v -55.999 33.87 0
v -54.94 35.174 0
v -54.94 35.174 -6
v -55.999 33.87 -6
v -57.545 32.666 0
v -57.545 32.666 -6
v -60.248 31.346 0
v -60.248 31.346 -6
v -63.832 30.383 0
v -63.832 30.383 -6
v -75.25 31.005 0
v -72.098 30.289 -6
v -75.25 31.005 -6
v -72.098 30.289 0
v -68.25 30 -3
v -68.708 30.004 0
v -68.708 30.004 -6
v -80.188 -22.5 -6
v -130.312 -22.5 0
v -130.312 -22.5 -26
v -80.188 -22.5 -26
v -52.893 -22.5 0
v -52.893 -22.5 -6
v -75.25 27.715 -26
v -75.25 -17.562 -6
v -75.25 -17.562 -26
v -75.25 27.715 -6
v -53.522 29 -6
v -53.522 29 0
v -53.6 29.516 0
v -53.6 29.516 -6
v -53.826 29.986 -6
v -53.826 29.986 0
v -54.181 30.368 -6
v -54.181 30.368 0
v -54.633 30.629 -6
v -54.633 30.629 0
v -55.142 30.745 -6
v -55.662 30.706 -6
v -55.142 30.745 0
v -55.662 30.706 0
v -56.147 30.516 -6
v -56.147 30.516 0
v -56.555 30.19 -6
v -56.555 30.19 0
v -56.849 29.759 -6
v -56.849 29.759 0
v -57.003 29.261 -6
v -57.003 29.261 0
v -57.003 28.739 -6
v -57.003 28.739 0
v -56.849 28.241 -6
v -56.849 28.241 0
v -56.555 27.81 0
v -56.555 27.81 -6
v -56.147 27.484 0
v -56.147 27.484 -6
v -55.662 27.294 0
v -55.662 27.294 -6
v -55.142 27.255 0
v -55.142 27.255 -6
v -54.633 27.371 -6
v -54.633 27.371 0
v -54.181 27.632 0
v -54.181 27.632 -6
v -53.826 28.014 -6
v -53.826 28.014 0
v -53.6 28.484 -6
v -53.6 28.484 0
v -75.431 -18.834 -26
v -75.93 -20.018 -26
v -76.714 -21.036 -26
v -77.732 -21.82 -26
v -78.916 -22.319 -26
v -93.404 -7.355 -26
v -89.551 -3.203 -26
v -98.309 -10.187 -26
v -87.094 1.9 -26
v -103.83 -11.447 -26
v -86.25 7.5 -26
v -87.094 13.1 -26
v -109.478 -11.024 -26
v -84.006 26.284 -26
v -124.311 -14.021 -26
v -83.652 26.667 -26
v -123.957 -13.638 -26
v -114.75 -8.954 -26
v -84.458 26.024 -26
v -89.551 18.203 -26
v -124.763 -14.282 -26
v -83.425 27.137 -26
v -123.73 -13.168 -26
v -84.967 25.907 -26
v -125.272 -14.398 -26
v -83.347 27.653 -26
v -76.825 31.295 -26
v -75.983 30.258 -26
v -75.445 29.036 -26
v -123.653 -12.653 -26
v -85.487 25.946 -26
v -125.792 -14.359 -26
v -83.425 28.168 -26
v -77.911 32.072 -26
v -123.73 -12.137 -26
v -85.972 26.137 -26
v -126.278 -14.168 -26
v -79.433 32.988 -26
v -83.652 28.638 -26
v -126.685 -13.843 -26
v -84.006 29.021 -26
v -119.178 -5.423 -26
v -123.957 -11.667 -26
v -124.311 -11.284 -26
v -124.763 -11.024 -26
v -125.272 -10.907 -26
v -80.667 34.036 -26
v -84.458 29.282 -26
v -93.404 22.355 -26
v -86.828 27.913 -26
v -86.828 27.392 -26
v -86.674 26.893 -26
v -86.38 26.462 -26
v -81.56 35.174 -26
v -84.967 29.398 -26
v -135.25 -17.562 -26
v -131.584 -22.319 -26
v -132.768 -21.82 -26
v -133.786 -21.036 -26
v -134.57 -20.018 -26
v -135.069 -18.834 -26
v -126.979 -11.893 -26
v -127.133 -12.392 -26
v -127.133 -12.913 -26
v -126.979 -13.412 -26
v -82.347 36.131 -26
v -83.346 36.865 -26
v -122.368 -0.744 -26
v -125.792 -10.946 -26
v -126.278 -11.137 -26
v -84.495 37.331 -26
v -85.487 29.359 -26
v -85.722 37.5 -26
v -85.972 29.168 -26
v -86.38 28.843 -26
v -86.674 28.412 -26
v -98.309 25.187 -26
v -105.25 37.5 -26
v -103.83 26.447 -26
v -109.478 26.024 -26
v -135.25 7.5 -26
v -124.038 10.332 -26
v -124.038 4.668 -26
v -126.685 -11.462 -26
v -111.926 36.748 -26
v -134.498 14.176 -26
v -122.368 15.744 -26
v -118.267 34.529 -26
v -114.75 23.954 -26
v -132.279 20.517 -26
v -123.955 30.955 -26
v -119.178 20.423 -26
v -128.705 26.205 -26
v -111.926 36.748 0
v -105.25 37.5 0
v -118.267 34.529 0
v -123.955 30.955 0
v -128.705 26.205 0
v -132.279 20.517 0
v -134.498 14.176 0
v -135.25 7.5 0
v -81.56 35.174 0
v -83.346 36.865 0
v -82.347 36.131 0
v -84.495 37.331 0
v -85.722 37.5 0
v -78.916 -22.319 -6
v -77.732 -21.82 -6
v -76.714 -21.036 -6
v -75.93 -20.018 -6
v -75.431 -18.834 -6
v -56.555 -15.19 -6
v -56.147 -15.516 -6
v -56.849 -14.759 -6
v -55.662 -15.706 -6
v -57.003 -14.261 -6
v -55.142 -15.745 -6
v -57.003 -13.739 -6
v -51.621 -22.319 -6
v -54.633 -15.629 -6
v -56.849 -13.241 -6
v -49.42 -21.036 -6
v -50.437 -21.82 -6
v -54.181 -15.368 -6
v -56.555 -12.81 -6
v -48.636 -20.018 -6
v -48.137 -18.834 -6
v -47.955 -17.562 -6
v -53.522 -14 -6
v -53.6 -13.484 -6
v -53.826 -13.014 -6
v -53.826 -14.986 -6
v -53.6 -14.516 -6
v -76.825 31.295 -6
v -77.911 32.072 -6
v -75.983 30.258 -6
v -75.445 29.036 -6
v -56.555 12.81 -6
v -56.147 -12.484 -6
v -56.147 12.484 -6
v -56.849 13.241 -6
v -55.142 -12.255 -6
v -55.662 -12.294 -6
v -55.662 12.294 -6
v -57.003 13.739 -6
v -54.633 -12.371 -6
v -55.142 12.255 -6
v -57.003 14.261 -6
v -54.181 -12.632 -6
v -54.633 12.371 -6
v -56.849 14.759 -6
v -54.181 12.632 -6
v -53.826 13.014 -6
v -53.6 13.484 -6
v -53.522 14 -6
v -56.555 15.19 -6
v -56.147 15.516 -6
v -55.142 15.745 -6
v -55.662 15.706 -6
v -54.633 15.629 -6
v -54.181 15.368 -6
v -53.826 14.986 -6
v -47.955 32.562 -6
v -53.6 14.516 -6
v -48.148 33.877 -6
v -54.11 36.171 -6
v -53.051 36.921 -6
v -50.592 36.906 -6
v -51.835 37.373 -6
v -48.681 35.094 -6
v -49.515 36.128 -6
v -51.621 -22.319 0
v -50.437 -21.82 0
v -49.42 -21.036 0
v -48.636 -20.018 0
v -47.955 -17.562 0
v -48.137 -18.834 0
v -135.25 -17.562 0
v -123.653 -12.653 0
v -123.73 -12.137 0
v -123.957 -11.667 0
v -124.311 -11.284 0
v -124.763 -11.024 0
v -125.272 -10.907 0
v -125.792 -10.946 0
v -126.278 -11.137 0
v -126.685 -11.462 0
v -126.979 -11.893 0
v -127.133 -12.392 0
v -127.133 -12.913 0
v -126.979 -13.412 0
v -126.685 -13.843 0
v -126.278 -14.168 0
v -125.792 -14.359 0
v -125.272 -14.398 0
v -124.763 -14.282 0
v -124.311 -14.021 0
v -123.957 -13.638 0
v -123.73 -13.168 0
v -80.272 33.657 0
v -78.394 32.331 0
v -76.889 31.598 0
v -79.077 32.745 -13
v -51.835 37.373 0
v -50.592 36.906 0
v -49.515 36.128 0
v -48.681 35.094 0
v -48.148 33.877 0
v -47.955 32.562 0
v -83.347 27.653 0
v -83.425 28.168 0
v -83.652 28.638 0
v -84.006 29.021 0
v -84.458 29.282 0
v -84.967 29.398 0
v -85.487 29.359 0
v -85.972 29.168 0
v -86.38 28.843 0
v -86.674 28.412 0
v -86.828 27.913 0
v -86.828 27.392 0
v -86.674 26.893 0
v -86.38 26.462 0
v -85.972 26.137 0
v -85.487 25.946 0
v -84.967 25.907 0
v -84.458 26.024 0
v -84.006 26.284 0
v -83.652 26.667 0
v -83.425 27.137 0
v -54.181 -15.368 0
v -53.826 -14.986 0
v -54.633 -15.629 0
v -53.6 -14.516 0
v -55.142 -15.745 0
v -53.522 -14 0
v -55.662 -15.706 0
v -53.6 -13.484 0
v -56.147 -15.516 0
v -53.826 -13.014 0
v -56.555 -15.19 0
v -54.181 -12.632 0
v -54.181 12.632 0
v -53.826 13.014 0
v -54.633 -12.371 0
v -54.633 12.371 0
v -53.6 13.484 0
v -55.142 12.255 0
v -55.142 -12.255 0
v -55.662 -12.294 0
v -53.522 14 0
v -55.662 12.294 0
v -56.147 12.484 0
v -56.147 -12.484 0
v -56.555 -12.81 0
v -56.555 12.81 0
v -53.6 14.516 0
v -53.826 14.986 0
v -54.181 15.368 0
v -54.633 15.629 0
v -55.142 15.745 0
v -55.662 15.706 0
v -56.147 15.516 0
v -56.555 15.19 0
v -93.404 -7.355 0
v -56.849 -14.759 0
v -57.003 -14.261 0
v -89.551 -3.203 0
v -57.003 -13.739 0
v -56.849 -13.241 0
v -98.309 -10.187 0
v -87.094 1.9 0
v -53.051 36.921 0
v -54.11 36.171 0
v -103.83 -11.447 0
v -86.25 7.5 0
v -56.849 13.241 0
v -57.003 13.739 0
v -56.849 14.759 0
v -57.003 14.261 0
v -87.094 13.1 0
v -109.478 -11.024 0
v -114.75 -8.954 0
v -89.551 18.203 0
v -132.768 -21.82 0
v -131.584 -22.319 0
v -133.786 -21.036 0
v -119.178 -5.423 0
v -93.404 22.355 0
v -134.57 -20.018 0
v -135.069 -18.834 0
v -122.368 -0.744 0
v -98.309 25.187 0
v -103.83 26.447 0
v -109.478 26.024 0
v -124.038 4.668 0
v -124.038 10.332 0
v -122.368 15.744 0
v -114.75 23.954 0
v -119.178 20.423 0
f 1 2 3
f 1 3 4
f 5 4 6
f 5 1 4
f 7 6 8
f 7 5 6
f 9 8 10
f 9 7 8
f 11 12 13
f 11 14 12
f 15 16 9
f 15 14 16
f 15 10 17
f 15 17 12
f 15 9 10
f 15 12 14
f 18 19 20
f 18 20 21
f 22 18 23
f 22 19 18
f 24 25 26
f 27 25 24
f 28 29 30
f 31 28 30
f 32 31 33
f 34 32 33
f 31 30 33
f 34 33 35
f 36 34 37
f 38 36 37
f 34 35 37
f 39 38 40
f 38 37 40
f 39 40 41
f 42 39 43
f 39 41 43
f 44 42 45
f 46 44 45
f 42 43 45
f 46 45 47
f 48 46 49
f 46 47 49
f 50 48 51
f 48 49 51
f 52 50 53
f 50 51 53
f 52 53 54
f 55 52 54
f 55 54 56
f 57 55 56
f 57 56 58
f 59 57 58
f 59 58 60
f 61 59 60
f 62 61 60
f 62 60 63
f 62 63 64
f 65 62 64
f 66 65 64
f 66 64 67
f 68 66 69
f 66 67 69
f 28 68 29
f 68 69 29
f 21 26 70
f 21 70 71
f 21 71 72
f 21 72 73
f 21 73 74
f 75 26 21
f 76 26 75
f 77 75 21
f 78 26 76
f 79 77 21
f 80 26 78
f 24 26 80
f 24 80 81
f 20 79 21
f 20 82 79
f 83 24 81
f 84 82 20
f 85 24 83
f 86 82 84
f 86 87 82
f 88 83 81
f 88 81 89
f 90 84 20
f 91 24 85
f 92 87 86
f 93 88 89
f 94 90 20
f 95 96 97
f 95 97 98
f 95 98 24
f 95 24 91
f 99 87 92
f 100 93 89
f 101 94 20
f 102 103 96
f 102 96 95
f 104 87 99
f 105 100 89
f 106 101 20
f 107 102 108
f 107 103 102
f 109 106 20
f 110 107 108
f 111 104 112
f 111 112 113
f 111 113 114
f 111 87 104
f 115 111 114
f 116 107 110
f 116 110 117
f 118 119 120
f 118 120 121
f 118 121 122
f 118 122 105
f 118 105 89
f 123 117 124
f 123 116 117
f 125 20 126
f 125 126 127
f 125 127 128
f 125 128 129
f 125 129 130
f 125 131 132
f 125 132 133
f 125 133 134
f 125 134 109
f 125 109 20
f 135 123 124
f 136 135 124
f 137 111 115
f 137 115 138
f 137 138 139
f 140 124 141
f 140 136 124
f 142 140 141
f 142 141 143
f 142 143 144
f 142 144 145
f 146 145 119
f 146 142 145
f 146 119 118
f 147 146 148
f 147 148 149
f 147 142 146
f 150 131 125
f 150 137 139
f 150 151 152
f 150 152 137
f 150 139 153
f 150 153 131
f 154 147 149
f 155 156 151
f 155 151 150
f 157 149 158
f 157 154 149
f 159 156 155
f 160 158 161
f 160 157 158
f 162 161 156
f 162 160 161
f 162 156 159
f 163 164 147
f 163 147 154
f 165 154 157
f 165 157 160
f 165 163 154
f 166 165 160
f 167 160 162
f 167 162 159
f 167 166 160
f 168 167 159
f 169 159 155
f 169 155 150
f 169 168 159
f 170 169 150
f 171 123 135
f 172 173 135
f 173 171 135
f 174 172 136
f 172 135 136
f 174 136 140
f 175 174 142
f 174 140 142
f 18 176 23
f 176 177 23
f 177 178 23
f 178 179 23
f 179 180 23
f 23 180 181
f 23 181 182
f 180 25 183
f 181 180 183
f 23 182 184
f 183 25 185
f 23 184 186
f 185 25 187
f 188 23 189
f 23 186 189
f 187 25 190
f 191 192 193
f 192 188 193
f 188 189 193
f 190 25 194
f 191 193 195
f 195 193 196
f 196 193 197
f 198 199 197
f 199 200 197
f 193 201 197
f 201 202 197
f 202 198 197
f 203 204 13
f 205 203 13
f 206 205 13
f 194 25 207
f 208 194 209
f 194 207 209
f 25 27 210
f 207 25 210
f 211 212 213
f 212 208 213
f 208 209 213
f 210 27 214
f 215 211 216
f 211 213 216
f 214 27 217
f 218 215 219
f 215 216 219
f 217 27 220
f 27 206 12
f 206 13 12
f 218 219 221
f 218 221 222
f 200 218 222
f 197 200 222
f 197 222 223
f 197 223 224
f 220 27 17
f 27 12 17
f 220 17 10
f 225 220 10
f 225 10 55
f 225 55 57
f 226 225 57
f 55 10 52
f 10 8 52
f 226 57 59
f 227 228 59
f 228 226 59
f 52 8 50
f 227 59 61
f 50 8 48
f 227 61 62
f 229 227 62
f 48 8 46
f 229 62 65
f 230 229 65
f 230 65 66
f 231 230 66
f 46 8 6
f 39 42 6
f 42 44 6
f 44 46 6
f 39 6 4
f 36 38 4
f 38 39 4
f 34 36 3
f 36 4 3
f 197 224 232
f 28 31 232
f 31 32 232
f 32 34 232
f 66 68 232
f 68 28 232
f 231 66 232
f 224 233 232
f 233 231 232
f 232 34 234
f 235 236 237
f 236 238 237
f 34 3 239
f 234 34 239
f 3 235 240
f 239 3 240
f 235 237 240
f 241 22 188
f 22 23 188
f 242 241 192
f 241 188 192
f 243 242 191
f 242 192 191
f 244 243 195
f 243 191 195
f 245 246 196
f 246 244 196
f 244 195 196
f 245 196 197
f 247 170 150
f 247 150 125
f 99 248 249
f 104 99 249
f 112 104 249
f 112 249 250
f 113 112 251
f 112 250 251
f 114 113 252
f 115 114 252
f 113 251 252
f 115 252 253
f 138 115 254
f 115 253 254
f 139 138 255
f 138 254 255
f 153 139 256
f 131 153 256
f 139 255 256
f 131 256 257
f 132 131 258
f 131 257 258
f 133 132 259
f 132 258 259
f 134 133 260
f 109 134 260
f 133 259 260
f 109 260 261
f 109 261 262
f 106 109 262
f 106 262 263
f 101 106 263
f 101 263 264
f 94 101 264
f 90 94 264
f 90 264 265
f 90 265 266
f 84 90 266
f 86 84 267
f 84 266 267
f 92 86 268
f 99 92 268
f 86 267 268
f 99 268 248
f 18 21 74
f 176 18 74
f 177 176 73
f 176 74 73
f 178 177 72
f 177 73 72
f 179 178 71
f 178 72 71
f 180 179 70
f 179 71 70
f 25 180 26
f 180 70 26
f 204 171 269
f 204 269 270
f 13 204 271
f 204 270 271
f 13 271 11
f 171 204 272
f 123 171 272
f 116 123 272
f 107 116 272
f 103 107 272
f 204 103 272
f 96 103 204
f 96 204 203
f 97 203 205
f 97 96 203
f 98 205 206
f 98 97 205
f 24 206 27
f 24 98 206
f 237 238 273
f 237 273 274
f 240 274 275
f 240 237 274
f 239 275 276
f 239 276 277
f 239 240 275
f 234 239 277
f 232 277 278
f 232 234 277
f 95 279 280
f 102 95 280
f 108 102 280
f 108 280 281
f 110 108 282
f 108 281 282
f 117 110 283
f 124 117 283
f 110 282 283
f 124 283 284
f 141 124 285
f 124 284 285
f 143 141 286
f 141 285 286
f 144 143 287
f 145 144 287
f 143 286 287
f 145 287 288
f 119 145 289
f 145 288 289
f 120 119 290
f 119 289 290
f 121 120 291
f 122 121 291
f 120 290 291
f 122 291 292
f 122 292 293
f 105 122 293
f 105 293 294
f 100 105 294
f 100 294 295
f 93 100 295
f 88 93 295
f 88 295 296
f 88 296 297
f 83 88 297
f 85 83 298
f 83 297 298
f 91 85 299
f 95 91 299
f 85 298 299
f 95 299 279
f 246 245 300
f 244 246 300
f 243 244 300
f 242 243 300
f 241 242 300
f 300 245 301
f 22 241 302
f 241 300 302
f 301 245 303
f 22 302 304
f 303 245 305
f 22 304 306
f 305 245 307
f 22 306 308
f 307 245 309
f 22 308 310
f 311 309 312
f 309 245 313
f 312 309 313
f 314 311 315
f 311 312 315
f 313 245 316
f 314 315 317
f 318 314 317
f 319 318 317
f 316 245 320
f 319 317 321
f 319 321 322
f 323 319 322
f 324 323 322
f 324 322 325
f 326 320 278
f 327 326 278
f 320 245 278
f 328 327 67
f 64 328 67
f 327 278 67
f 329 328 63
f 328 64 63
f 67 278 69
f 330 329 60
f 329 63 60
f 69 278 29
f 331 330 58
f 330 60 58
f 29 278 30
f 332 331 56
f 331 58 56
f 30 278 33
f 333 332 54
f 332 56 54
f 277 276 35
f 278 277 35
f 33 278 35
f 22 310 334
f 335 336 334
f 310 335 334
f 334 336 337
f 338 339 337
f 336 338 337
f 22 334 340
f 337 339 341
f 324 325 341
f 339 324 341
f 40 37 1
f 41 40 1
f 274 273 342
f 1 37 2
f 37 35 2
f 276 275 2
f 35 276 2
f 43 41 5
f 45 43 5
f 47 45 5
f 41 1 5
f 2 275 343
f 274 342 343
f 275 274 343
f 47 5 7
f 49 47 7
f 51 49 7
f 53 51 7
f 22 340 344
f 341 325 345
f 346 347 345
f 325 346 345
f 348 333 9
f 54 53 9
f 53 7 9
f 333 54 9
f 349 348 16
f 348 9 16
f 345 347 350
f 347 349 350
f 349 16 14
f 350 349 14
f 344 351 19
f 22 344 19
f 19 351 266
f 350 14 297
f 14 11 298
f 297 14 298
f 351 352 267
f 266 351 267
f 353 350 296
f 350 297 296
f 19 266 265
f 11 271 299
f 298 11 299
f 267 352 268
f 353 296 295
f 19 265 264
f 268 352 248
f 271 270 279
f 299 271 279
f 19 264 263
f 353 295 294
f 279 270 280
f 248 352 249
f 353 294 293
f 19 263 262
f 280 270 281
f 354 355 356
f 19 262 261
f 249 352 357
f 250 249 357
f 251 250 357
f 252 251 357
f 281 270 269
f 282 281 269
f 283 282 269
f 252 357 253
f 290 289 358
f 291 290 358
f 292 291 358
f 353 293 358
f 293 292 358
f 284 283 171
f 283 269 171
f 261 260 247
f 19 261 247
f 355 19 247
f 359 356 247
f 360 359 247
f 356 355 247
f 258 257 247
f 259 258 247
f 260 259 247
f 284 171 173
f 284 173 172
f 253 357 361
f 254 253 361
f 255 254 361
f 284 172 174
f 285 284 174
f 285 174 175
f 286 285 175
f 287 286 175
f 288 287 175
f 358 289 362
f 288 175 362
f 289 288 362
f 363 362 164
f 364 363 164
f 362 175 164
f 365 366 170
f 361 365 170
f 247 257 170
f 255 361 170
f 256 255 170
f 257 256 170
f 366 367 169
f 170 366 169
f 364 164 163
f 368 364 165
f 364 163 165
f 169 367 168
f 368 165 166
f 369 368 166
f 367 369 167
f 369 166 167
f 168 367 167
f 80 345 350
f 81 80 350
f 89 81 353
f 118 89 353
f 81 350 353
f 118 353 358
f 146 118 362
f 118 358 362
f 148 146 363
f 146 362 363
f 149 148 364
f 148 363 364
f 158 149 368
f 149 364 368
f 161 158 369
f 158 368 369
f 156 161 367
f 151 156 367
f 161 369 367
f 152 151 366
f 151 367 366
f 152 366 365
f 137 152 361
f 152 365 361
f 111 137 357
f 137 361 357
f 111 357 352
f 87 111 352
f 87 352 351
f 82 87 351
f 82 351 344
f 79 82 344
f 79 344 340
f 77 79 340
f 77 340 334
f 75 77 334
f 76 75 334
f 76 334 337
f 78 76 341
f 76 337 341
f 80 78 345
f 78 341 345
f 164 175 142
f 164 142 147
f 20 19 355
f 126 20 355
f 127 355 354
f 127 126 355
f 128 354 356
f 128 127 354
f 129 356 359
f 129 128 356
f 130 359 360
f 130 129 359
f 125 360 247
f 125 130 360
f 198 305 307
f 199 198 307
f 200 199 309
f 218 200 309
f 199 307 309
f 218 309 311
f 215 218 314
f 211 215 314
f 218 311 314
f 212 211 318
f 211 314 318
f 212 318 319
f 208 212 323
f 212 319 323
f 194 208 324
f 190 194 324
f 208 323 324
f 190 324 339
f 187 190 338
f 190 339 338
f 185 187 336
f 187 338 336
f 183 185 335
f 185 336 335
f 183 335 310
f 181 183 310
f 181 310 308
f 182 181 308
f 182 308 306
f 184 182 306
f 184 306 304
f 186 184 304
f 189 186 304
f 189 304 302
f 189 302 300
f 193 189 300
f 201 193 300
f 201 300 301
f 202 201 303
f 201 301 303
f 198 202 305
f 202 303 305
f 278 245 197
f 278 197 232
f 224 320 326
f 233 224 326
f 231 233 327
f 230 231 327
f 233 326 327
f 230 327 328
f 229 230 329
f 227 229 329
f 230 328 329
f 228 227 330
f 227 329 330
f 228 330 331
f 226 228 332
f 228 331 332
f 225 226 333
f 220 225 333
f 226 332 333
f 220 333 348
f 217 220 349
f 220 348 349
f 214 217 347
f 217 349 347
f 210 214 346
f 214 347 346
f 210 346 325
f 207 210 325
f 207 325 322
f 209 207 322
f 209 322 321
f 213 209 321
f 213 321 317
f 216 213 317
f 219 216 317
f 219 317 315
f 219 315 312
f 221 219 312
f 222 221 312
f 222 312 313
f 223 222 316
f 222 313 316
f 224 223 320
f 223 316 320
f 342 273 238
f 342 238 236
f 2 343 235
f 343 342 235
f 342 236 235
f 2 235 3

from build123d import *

# Parameters (mm, degrees)
F0_R         = 1.75
F1_DEPTH     = 6
F0_R_2       = 19
F2_DEPTH     = 26
F3_T1_DEPTH  = 51.0048285071
F3_T3_DEPTH  = 32.5024142536
F3_T5_DEPTH  = 23.67798751
F3_T7_DEPTH  = 31.0048285071
F3_T9_DEPTH  = 43.67798751
F3_T11_DEPTH = 28.3837127694


# Not quite as in the source:
# - a fillet or chamfer that OpenCascade refuses, or shapes differently, is made with other operations: its cross-section is extruded or revolved along the edge and cut away or added


with BuildPart() as f1:
    # F0 (on Top) → F1 (new body)
    with BuildSketch(Plane.XY):
        with BuildLine():
            Line((-47.9554124177, 37.5), (-54.25, 37.5))
            add(Edge.make_bspline(
                [(-68.25, 30), (-54.25, 30), (-54.25, 37.5)],
                knots=[1.5707963268, 1.5707963268, 1.5707963268, 3.1415926536, 3.1415926536, 3.1415926536], degree=2, weights=[1, 0.7071067812, 1]))
            Line((-68.25, 30), (-68.25, -22.5))
            Line((-68.25, -22.5), (-47.9554124177, -22.5))
            Line((-47.9554124177, -22.5), (-47.9554124177, 37.5))
        make_face()
        with Locations((-55.2723892033, -14)):
            Circle(F0_R, mode=Mode.SUBTRACT)
        with Locations((-55.2723892033, 13.9999985695)):
            Circle(F0_R, mode=Mode.SUBTRACT)
        with Locations((-55.2723892033, 28.9999985695)):
            Circle(F0_R, mode=Mode.SUBTRACT)
        with BuildLine():
            Line((-68.25, -22.5), (-68.25, 30))
            add(Edge.make_bspline(
                [(-75.25, 31.0048094716), (-72.001288694, 30), (-68.25, 30)],
                knots=[1.0471975512, 1.0471975512, 1.0471975512, 1.5707963268, 1.5707963268, 1.5707963268], degree=2, weights=[1, 0.9659258263, 1]))
            Line((-75.25, 31.0048094716), (-75.25, 30))
            Line((-75.25, 30), (-75.25, -22.5))
            Line((-75.25, -22.5), (-68.25, -22.5))
        make_face()
    extrude(amount=-F1_DEPTH)

    # F0 (on Top) → F2 (join)
    with BuildSketch(Plane.XY):
        with BuildLine():
            add(Edge.make_bspline(
                [(-82.25, 37.5), (-82.25, 33.1698729811), (-75.25, 31.0048094716)],
                knots=[0, 0, 0, 1.0471975512, 1.0471975512, 1.0471975512], degree=2, weights=[1, 0.8660254038, 1]))
            Line((-82.25, 37.5), (-105.25, 37.5))
            ThreePointArc((-105.25, 37.5), (-126.4632034356, 28.7132034356), (-135.25, 7.5))
            Line((-135.25, 7.5), (-135.25, -22.5))
            Line((-135.25, -22.5), (-75.25, -22.5))
            Line((-75.25, -22.5), (-75.25, 30))
            Line((-75.25, 30), (-75.25, 31.0048094716))
        make_face()
        with Locations((-125.4025432638, -12.6525432638)):
            Circle(F0_R, mode=Mode.SUBTRACT)
        with Locations((-105.25, 7.5)):
            Circle(F0_R_2, mode=Mode.SUBTRACT)
        with Locations((-85.0974567362, 27.6525432638)):
            Circle(F0_R, mode=Mode.SUBTRACT)
    extrude(amount=-F2_DEPTH)

    # F3: fillet of radius 5 on 8 edges, made by hand

    # F3_s2 → F3_t1 (cut)
    with BuildSketch(Plane.XY.offset(-38.5024142536)):
        with BuildLine():
            ThreePointArc((-130.2490343146, -22.5004), (-133.7855339059, -21.0355339059), (-135.2504, -17.4990343146))
            Line((-135.2504, -17.4990343146), (-135.7505365685, -17.4990343146))
            ThreePointArc((-135.7505365685, -17.4990343146), (-135.7501365685, -19.9995171573), (-135.7501365685, -22.5))
            Line((-135.7501365685, -22.5), (-135.25, -23.0001365685))
            ThreePointArc((-135.25, -23.0001365685), (-132.7495171573, -23.0001365685), (-130.2490343146, -23.0005365685))
            Line((-130.2490343146, -23.0005365685), (-130.2490343146, -22.5004))
        make_face()
    extrude(amount=F3_T1_DEPTH, mode=Mode.SUBTRACT)

    # F3_s4 → F3_t3 (cut)
    with BuildSketch(Plane.XY.offset(-38.5024142536)):
        with BuildLine():
            ThreePointArc((-80.2509656854, -22.5004), (-76.7144660941, -21.0355339059), (-75.2496, -17.4990343146))
            Line((-75.2496, -17.4990343146), (-74.7494634315, -17.4990343146))
            ThreePointArc((-74.7494634315, -17.4990343146), (-74.7498634315, -19.9995171573), (-74.7498634315, -22.5))
            Line((-74.7498634315, -22.5), (-75.25, -23.0001365685))
            ThreePointArc((-75.25, -23.0001365685), (-77.7504828427, -23.0001365685), (-80.2509656854, -23.0005365685))
            Line((-80.2509656854, -23.0005365685), (-80.2509656854, -22.5004))
        make_face()
    extrude(amount=F3_T3_DEPTH, mode=Mode.SUBTRACT)

    # F3_s6 → F3_t5 (cut)
    with BuildSketch(Plane.XY.offset(-14.838993755)):
        with BuildLine():
            ThreePointArc((-50.7144025206, 37.5004), (-53.1463779594, 36.8692922228), (-54.9645855955, 35.1352441979))
            Line((-54.9645855955, 35.1352441979), (-55.389603903, 35.3988651863))
            ThreePointArc((-55.389603903, 35.3988651863), (-54.9183796159, 36.414502766), (-54.7501365685, 37.5))
            Line((-54.7501365685, 37.5), (-54.25, 38.0001365685))
            ThreePointArc((-54.25, 38.0001365685), (-52.4822012603, 38.0001365685), (-50.7144025206, 38.0005365685))
            Line((-50.7144025206, 38.0005365685), (-50.7144025206, 37.5004))
        make_face()
    extrude(amount=F3_T5_DEPTH, mode=Mode.SUBTRACT)

    # F3_s8 → F3_t7 (cut)
    with BuildSketch(Plane.XY.offset(-18.5024142536)):
        with BuildLine():
            ThreePointArc((-52.9563781031, 37.5004), (-49.4198785117, 36.0355339059), (-47.9550124177, 32.4990343146))
            Line((-47.9550124177, 32.4990343146), (-47.4548758491, 32.4990343146))
            ThreePointArc((-47.4548758491, 32.4990343146), (-47.4552758491, 34.9995171573), (-47.4552758491, 37.5))
            Line((-47.4552758491, 37.5), (-47.9554124177, 38.0001365685))
            ThreePointArc((-47.9554124177, 38.0001365685), (-50.4558952604, 38.0001365685), (-52.9563781031, 38.0005365685))
            Line((-52.9563781031, 38.0005365685), (-52.9563781031, 37.5004))
        make_face()
        with BuildLine():
            ThreePointArc((-52.9563781031, -22.5004), (-49.4198785117, -21.0355339059), (-47.9550124177, -17.4990343146))
            Line((-47.9550124177, -17.4990343146), (-47.4548758491, -17.4990343146))
            ThreePointArc((-47.4548758491, -17.4990343146), (-47.4552758491, -19.9995171573), (-47.4552758491, -22.5))
            Line((-47.4552758491, -22.5), (-47.9554124177, -23.0001365685))
            ThreePointArc((-47.9554124177, -23.0001365685), (-50.4558952604, -23.0001365685), (-52.9563781031, -23.0005365685))
            Line((-52.9563781031, -23.0005365685), (-52.9563781031, -22.5004))
        make_face()
    extrude(amount=F3_T7_DEPTH, mode=Mode.SUBTRACT)

    # F3_s10 → F3_t9 (cut)
    with BuildSketch(Plane.XY.offset(-34.838993755)):
        with BuildLine():
            ThreePointArc((-81.5354144045, 35.1352441979), (-83.3536220406, 36.8692922228), (-85.7855974794, 37.5004))
            Line((-85.7855974794, 37.5004), (-85.7855974794, 38.0005365685))
            ThreePointArc((-85.7855974794, 38.0005365685), (-84.0177987397, 38.0001365685), (-82.25, 38.0001365685))
            Line((-82.25, 38.0001365685), (-81.7498634315, 37.5))
            ThreePointArc((-81.7498634315, 37.5), (-81.5816203841, 36.414502766), (-81.110396097, 35.3988651863))
            Line((-81.110396097, 35.3988651863), (-81.5354144045, 35.1352441979))
        make_face()
    extrude(amount=F3_T9_DEPTH, mode=Mode.SUBTRACT)

    # F3_s12 → F3_t11 (cut)
    with BuildSketch(Plane.XY.offset(-34.3837127694)):
        with BuildLine():
            ThreePointArc((-77.9590299164, 32.0970407857), (-75.9803326171, 30.2544669483), (-75.2496, 27.6513243877))
            Line((-75.2496, 27.6513243877), (-74.7493950565, 27.6513243877))
            ThreePointArc((-74.7493950565, 27.6513243877), (-74.7497950565, 29.3280669297), (-74.7497950565, 31.0048094716))
            Line((-74.7497950565, 31.0048094716), (-75.1021974152, 31.4826790996))
            ThreePointArc((-75.1021974152, 31.4826790996), (-76.4425248665, 31.9557259843), (-77.7297679646, 32.5416124255))
            Line((-77.7297679646, 32.5416124255), (-77.9590299164, 32.0970407857))
        make_face()
    extrude(amount=F3_T11_DEPTH, mode=Mode.SUBTRACT)


solid = f1.part
